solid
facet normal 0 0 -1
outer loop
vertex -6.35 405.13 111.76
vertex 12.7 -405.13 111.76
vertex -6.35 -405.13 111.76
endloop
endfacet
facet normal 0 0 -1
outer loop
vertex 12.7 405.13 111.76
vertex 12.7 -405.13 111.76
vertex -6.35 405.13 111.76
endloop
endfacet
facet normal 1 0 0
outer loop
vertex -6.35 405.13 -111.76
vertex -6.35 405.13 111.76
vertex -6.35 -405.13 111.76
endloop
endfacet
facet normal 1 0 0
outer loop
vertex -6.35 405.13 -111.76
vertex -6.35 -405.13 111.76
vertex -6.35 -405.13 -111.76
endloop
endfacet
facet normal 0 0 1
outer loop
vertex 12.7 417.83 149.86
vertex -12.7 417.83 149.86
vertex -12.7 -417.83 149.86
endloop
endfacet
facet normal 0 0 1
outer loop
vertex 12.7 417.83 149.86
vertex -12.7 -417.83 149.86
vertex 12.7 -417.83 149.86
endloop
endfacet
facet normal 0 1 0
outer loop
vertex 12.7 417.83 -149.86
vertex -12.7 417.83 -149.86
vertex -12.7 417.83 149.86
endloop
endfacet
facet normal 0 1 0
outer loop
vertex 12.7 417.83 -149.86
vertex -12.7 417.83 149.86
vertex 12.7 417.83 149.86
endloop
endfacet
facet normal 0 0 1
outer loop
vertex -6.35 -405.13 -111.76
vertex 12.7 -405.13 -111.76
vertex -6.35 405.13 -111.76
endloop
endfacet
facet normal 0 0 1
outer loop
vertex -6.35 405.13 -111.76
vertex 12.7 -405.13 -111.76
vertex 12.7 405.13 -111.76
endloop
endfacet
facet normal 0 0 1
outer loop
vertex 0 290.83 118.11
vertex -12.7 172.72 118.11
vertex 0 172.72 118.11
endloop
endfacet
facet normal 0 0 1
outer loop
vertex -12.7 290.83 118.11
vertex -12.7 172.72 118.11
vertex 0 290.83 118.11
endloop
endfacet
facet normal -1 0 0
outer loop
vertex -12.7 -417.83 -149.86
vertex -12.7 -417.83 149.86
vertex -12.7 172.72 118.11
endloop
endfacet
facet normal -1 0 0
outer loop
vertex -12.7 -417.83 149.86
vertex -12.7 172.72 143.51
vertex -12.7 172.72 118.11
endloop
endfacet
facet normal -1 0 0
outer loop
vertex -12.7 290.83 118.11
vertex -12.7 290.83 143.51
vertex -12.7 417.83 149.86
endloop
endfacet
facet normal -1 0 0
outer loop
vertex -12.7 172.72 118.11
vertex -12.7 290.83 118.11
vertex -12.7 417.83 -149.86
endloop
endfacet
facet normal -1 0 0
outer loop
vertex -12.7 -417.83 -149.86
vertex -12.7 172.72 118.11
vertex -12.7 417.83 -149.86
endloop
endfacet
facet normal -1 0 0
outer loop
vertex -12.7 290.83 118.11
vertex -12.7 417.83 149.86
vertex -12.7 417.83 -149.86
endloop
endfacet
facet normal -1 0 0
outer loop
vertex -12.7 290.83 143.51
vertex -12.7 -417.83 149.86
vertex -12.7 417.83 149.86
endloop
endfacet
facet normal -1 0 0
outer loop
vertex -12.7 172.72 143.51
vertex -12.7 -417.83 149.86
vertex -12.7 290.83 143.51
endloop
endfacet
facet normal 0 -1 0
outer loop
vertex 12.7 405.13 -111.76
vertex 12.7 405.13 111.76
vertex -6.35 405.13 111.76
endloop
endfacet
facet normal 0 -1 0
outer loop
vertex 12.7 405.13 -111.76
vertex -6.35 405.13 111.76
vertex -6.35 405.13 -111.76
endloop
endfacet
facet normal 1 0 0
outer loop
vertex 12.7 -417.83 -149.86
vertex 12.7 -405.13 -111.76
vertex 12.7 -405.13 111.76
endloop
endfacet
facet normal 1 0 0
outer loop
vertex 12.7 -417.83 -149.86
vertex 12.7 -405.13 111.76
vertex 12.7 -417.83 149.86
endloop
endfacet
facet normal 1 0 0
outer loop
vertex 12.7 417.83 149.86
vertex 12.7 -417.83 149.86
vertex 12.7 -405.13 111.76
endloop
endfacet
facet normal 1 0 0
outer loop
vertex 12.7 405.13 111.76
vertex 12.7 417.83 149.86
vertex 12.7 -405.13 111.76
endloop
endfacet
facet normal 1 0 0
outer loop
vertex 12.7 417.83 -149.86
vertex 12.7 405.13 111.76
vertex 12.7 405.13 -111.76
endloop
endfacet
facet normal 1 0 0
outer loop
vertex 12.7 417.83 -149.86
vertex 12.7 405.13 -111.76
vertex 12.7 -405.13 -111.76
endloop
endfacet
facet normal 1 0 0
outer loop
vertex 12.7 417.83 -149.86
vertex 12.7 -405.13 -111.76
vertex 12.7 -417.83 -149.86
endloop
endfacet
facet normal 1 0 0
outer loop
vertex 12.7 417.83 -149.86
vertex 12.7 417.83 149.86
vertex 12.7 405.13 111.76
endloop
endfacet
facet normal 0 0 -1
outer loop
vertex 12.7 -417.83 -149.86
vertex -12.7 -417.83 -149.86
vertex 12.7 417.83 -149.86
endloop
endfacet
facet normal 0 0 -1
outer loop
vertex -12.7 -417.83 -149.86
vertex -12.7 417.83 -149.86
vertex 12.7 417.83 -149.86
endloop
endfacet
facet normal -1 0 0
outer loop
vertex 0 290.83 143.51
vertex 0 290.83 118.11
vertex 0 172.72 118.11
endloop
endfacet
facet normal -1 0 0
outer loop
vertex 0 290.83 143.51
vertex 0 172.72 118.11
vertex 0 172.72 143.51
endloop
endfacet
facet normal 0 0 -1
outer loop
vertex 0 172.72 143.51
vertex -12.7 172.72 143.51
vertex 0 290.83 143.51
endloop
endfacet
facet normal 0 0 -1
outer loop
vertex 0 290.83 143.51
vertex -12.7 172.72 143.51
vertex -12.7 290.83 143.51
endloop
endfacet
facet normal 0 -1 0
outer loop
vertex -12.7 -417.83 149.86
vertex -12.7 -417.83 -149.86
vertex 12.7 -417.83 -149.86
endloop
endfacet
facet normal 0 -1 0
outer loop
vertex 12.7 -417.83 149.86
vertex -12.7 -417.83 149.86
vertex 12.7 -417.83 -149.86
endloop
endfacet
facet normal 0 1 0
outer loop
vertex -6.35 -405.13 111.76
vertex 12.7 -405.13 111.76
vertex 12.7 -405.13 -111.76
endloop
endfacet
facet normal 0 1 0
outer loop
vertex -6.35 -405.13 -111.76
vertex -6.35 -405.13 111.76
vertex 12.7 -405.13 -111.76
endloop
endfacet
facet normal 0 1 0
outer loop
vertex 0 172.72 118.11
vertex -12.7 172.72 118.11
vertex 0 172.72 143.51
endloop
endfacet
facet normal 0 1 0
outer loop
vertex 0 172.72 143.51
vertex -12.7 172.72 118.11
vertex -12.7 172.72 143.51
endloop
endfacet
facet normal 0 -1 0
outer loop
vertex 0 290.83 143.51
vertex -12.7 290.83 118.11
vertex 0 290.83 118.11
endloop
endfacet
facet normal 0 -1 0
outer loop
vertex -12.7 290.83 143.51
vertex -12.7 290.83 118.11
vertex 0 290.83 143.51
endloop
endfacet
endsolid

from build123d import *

# Parameters (mm, degrees)
SKETCH1_W           = 25.4
SKETCH1_H           = 299.72
BOSS_EXTRUDE1_DEPTH = 417.83
SKETCH2_W           = 223.52
SKETCH2_H           = 810.26
CUT_EXTRUDE1_DEPTH  = 19.05
SKETCH3_W           = 25.4
SKETCH3_H           = 118.11
CUT_EXTRUDE2_DEPTH  = 12.7


with BuildPart() as part:
    # Sketch1 → Boss-Extrude1 (new, symmetric)
    with BuildSketch(Plane(origin=(0, 0, 0), x_dir=(1, 0, 0), z_dir=(0, 1, 0))):
        Rectangle(SKETCH1_W, SKETCH1_H)
    extrude(amount=BOSS_EXTRUDE1_DEPTH, both=True)

    # Sketch2 → Cut-Extrude1 (cut)
    with BuildSketch(Plane(origin=(12.7, 0, 0), x_dir=(0, 0, -1), z_dir=(1, 0, 0))):
        Rectangle(SKETCH2_W, SKETCH2_H)
    extrude(amount=-CUT_EXTRUDE1_DEPTH, mode=Mode.SUBTRACT)

    # Sketch3 → Cut-Extrude2 (cut)
    with BuildSketch(Plane.ZY.offset(12.7)):
        with Locations((130.81, 231.775)):
            Rectangle(SKETCH3_W, SKETCH3_H)
    extrude(amount=-CUT_EXTRUDE2_DEPTH, mode=Mode.SUBTRACT)


solid = part.part
